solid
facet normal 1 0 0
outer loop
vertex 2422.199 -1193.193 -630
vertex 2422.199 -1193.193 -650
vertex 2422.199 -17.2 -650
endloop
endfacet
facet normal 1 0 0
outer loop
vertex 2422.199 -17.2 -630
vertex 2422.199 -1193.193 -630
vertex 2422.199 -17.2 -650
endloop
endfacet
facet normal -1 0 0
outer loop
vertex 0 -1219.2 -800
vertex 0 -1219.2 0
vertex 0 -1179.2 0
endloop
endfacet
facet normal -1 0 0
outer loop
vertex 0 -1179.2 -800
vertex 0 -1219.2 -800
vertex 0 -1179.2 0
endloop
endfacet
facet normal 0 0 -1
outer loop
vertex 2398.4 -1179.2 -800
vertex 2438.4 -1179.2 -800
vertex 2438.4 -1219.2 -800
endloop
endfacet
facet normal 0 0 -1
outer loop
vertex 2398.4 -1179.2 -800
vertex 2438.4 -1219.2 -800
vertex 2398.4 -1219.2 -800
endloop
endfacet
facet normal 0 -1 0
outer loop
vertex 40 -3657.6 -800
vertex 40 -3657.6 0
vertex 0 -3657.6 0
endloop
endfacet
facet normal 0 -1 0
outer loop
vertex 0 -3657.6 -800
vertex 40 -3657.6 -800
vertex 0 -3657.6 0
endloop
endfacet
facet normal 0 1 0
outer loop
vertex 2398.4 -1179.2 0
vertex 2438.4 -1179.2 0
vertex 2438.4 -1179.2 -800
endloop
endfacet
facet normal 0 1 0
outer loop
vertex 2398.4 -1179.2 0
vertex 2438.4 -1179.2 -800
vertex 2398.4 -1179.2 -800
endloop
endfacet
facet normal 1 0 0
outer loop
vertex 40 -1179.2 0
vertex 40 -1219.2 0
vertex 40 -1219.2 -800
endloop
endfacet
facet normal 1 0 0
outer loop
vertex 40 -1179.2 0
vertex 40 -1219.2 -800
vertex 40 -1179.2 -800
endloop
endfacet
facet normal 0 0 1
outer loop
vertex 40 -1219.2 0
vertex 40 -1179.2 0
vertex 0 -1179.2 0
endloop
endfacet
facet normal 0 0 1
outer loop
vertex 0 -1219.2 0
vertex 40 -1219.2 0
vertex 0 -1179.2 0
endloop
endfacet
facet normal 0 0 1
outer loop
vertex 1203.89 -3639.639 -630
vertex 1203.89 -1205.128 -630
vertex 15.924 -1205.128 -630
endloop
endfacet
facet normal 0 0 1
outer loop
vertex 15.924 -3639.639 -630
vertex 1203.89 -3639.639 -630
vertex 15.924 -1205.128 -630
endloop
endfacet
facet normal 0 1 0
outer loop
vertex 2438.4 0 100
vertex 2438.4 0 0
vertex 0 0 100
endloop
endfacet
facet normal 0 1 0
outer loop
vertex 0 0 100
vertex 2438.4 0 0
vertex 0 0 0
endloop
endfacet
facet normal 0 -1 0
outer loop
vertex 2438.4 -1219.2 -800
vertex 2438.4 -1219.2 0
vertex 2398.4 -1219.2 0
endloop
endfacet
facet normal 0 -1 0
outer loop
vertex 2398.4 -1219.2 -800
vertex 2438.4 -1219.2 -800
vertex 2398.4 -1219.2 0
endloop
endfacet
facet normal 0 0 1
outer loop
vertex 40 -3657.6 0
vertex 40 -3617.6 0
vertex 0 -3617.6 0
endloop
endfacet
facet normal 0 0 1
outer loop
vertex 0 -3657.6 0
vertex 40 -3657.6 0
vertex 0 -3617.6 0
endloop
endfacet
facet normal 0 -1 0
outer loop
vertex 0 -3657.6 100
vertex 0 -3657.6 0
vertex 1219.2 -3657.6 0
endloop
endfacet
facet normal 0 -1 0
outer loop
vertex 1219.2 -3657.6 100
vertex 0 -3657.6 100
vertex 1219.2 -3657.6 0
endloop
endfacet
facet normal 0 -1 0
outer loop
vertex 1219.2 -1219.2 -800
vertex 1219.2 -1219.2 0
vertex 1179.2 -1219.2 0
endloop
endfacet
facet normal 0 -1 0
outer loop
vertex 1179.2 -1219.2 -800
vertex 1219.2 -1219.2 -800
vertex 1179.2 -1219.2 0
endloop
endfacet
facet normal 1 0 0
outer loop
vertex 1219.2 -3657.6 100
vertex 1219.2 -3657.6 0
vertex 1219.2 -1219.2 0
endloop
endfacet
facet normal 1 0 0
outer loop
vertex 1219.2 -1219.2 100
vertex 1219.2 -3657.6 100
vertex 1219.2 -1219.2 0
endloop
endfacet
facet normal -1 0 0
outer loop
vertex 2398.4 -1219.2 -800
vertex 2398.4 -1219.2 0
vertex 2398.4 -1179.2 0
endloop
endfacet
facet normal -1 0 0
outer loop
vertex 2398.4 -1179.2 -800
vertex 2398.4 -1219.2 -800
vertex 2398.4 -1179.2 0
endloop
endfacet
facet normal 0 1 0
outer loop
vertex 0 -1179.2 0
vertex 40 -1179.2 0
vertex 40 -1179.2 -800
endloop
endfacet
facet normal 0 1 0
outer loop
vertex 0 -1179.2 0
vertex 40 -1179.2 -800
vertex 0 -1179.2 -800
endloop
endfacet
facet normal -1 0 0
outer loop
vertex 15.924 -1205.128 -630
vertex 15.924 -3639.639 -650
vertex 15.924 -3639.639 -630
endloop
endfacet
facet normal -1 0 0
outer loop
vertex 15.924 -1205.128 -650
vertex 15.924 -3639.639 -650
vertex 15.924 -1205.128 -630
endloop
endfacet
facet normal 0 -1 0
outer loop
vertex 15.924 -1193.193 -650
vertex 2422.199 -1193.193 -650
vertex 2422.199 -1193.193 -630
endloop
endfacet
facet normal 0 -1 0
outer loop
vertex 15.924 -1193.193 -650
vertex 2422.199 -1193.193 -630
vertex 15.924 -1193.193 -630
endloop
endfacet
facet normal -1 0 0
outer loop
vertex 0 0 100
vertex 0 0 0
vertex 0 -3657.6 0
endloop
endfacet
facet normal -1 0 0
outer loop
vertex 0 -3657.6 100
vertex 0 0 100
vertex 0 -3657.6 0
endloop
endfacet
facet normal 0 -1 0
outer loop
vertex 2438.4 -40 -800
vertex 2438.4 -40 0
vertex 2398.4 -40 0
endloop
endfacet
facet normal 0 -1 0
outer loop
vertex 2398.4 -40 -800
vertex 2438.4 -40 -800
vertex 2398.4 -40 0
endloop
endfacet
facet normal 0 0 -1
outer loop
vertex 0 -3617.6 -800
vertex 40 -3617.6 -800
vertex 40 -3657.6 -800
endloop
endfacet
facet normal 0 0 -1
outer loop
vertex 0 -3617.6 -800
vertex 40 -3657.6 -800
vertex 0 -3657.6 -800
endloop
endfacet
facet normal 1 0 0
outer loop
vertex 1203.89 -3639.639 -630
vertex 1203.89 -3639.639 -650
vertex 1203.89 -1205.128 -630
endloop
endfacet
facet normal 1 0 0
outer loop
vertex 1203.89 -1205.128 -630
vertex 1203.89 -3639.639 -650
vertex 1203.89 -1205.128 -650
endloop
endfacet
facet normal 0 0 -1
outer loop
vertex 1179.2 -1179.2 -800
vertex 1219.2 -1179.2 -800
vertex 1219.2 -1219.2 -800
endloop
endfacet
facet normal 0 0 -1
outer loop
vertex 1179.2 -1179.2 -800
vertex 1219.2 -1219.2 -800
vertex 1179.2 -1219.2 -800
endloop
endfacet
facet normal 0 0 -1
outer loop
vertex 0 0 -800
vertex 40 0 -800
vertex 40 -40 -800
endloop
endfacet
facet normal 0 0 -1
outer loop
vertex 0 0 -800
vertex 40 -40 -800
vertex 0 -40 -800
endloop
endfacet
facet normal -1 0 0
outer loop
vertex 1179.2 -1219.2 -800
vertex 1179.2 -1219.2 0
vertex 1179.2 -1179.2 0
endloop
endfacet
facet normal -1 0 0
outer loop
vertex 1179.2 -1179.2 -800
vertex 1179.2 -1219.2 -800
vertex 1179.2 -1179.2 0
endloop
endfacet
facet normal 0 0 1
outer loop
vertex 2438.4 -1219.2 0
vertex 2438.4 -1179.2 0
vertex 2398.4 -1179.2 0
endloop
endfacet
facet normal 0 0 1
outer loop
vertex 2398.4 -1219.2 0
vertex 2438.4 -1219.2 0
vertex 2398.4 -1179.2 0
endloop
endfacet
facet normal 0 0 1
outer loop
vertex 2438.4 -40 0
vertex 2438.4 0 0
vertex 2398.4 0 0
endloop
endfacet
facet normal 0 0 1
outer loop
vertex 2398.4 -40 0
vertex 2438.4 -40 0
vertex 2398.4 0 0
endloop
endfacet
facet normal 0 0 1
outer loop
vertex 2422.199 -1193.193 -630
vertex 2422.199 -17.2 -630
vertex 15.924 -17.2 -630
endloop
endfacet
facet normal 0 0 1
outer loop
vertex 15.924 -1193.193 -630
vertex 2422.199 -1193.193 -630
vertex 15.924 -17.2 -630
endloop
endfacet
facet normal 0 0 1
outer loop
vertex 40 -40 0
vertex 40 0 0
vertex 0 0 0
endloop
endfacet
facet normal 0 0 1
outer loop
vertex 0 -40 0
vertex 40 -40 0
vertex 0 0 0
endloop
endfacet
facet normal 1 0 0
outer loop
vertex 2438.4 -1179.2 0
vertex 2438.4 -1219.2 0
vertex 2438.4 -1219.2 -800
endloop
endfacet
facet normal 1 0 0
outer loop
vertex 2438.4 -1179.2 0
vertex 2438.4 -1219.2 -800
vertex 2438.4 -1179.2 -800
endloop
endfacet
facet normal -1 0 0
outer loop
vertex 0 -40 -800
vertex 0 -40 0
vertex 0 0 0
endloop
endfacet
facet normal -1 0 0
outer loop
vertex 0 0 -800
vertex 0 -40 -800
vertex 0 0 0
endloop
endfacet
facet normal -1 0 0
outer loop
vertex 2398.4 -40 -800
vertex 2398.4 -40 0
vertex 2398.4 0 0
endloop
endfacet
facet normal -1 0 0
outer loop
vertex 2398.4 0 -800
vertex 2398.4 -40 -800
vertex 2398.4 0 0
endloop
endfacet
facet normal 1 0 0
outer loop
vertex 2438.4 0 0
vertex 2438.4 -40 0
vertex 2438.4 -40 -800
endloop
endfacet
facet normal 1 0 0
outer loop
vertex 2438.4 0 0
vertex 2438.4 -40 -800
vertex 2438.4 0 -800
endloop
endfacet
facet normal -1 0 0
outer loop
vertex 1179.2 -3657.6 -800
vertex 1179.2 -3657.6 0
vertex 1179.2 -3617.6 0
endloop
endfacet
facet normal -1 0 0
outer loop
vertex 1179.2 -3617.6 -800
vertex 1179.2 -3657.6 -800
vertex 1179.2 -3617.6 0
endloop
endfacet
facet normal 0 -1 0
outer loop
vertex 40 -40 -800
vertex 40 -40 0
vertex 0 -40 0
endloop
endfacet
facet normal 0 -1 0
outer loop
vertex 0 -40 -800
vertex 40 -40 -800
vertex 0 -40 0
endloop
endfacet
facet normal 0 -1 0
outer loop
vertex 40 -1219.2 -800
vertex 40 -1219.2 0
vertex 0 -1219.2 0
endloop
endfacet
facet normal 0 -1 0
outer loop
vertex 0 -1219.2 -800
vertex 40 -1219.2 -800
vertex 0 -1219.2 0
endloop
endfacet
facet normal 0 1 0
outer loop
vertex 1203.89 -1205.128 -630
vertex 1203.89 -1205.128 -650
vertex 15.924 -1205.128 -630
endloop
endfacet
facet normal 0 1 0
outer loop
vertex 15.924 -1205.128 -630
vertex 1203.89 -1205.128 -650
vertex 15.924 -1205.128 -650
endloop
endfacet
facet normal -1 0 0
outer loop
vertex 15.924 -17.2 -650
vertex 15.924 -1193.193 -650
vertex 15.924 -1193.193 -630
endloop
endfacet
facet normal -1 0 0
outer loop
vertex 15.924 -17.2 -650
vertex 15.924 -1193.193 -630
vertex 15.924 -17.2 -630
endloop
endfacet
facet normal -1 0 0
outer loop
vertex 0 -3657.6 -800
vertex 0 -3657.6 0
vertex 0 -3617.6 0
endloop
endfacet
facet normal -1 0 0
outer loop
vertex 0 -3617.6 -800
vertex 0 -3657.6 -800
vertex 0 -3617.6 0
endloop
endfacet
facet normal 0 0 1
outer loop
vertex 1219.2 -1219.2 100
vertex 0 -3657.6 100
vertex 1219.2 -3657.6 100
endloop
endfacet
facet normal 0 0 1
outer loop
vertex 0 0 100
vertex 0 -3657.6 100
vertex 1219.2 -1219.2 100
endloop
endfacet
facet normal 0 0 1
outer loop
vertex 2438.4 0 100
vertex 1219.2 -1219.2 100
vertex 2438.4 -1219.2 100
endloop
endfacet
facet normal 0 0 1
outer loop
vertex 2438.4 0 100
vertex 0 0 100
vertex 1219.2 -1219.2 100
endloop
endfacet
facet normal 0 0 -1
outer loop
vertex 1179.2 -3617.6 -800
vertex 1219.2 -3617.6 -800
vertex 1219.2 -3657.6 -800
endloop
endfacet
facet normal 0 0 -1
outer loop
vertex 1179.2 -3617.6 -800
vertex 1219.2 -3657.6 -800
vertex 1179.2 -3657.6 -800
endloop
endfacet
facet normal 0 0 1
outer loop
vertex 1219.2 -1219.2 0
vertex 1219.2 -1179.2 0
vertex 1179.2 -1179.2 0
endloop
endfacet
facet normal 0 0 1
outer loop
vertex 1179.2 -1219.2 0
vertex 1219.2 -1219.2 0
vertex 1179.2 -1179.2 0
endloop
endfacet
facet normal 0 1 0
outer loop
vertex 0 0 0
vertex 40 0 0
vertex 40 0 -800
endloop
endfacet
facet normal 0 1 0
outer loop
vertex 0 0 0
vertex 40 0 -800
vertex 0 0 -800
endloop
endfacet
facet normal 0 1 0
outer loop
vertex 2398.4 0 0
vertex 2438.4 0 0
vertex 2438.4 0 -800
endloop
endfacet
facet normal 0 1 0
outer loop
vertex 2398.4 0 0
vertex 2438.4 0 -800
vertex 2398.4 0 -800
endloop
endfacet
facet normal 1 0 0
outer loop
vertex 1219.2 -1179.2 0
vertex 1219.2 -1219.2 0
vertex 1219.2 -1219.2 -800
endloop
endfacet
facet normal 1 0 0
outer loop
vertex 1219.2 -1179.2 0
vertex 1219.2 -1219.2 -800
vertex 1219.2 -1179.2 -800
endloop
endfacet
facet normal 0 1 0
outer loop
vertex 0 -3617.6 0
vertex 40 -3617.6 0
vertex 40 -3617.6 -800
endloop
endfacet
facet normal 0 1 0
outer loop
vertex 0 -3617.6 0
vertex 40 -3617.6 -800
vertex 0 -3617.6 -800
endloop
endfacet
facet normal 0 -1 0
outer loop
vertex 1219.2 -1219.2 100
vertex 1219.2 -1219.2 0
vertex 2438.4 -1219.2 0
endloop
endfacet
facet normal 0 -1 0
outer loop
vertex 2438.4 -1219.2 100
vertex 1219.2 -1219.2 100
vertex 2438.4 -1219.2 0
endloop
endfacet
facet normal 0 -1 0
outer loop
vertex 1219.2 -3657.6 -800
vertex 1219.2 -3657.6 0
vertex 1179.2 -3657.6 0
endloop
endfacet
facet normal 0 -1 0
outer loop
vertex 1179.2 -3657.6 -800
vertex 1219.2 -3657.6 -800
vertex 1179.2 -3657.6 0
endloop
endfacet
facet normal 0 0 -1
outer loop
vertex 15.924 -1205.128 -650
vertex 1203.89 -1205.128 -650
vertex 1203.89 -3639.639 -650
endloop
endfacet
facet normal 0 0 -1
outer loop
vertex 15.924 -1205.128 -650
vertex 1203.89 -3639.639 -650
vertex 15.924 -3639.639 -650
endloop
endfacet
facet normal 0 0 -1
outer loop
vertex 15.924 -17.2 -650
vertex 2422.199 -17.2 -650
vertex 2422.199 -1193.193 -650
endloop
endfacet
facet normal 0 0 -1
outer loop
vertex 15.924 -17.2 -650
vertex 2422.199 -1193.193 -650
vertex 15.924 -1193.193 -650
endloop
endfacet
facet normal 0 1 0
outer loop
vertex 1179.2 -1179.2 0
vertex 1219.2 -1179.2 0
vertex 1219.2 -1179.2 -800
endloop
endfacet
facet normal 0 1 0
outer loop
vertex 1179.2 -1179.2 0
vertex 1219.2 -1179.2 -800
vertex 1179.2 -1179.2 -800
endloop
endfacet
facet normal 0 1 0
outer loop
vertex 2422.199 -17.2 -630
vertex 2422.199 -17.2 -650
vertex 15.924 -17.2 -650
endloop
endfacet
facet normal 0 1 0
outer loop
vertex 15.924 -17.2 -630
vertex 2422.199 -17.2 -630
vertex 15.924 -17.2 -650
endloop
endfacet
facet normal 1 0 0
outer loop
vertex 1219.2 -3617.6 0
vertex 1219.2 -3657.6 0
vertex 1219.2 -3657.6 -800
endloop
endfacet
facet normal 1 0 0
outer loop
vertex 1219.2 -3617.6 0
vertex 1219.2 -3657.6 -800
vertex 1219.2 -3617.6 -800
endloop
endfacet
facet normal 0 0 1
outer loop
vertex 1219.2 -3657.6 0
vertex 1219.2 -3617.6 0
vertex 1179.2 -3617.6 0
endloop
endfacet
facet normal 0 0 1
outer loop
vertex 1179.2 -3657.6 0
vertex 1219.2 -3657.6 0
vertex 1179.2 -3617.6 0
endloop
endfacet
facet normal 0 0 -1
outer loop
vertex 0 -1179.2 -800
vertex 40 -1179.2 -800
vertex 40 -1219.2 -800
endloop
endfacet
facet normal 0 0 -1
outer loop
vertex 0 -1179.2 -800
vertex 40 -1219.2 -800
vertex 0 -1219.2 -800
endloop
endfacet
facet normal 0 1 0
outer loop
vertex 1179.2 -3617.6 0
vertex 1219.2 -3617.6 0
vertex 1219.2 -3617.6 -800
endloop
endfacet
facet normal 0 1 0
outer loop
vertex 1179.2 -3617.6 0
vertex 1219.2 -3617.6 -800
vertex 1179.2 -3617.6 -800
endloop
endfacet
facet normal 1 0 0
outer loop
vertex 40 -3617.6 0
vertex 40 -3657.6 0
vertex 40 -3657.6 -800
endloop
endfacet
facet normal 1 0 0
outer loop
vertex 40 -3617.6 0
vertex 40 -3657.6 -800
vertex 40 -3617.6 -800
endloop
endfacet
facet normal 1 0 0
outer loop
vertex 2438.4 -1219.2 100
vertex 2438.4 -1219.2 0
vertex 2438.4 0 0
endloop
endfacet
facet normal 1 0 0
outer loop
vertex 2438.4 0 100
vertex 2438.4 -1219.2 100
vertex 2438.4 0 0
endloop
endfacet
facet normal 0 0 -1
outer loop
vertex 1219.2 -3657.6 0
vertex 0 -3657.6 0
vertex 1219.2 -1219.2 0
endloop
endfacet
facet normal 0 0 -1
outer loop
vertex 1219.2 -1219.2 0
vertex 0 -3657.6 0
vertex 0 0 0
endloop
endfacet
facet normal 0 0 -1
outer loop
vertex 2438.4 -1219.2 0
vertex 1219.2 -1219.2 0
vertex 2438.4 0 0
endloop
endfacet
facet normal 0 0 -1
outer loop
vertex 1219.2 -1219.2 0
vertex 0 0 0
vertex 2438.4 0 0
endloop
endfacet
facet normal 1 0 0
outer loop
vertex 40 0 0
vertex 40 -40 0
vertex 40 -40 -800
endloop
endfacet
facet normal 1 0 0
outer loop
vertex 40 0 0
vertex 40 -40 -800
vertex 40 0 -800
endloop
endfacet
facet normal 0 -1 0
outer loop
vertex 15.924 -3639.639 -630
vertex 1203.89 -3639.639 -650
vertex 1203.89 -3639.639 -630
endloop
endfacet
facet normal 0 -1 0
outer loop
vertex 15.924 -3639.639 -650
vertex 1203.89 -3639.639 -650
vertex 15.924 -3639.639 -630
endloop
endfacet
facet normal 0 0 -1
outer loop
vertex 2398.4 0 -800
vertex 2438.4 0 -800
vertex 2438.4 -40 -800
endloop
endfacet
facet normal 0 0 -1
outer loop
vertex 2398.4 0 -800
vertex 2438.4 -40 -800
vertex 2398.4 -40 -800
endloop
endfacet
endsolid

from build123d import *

# Parameters (mm, degrees)
BOSS_EXTRUDE1_DEPTH   = 100
SKETCH4_W             = 40
SKETCH4_H             = 40
BOSS_EXTRUDE2_DEPTH   = 800
BOSS_EXTRUDE2_2_DEPTH = 800
BOSS_EXTRUDE2_3_DEPTH = 800
BOSS_EXTRUDE2_4_DEPTH = 800
BOSS_EXTRUDE2_5_DEPTH = 800
BOSS_EXTRUDE2_6_DEPTH = 800
BOSS_EXTRUDE2_7_DEPTH = 800
SKETCH6_W             = 1187.965611175
SKETCH6_H             = 2434.511231257
BOSS_EXTRUDE3_DEPTH   = 20
SKETCH6_W_2           = 2406.275176363
SKETCH6_H_2           = 1175.992672809
BOSS_EXTRUDE3_2_DEPTH = 20


with BuildPart() as part:
    # Sketch3 → Boss-Extrude1 (new body)
    with BuildSketch(Plane.XY):
        Polygon((2438.4, -1219.2), (2438.4, 0), (0, 0), (0, -3657.6), (1219.2, -3657.6), (1219.2, -1219.2), align=None)
    extrude(amount=BOSS_EXTRUDE1_DEPTH)


with BuildPart() as body_2:
    # Sketch4 → Boss-Extrude2 (new body)
    with BuildSketch(Plane(origin=(0, 0, 0), x_dir=(-1, 0, 0), z_dir=(0, 0, -1))):
        with Locations((-2418.4, -20)):
            Rectangle(SKETCH4_W, SKETCH4_H)
    extrude(amount=BOSS_EXTRUDE2_DEPTH)


with BuildPart() as body_3:
    # Sketch4 → Boss-Extrude2 2 (new body)
    with BuildSketch(Plane(origin=(0, 0, 0), x_dir=(-1, 0, 0), z_dir=(0, 0, -1))):
        with Locations((-20, -3637.6)):
            Rectangle(SKETCH4_W, SKETCH4_H)
    extrude(amount=BOSS_EXTRUDE2_2_DEPTH)


with BuildPart() as body_4:
    # Sketch4 → Boss-Extrude2 3 (new body)
    with BuildSketch(Plane(origin=(0, 0, 0), x_dir=(-1, 0, 0), z_dir=(0, 0, -1))):
        with Locations((-20, -20)):
            Rectangle(SKETCH4_W, SKETCH4_H)
    extrude(amount=BOSS_EXTRUDE2_3_DEPTH)


with BuildPart() as body_5:
    # Sketch4 → Boss-Extrude2 4 (new body)
    with BuildSketch(Plane(origin=(0, 0, 0), x_dir=(-1, 0, 0), z_dir=(0, 0, -1))):
        with Locations((-1199.2, -3637.6)):
            Rectangle(SKETCH4_W, SKETCH4_H)
    extrude(amount=BOSS_EXTRUDE2_4_DEPTH)


with BuildPart() as body_6:
    # Sketch4 → Boss-Extrude2 5 (new body)
    with BuildSketch(Plane(origin=(0, 0, 0), x_dir=(-1, 0, 0), z_dir=(0, 0, -1))):
        with Locations((-1199.2, -1199.2)):
            Rectangle(SKETCH4_W, SKETCH4_H)
    extrude(amount=BOSS_EXTRUDE2_5_DEPTH)


with BuildPart() as body_7:
    # Sketch4 → Boss-Extrude2 6 (new body)
    with BuildSketch(Plane(origin=(0, 0, 0), x_dir=(-1, 0, 0), z_dir=(0, 0, -1))):
        with Locations((-2418.4, -1199.2)):
            Rectangle(SKETCH4_W, SKETCH4_H)
    extrude(amount=BOSS_EXTRUDE2_6_DEPTH)


with BuildPart() as body_8:
    # Sketch4 → Boss-Extrude2 7 (new body)
    with BuildSketch(Plane(origin=(0, 0, 0), x_dir=(-1, 0, 0), z_dir=(0, 0, -1))):
        with Locations((-20, -1199.2)):
            Rectangle(SKETCH4_W, SKETCH4_H)
    extrude(amount=BOSS_EXTRUDE2_7_DEPTH)


with BuildPart() as body_9:
    # Sketch6 → Boss-Extrude3 (new body)
    with BuildSketch(Plane(origin=(0, 0, -650), x_dir=(-1, 0, 0), z_dir=(0, 0, -1))):
        with Locations((-609.9067477, -2422.383402445)):
            Rectangle(SKETCH6_W, SKETCH6_H)
    extrude(amount=-BOSS_EXTRUDE3_DEPTH)


with BuildPart() as body_10:
    # Sketch6 → Boss-Extrude3 2 (new body)
    with BuildSketch(Plane(origin=(0, 0, -650), x_dir=(-1, 0, 0), z_dir=(0, 0, -1))):
        with Locations((-1219.061530294, -605.196403842)):
            Rectangle(SKETCH6_W_2, SKETCH6_H_2)
    extrude(amount=-BOSS_EXTRUDE3_2_DEPTH)


solid = Compound([part.part, body_2.part, body_3.part, body_4.part, body_5.part, body_6.part, body_7.part, body_8.part, body_9.part, body_10.part])
